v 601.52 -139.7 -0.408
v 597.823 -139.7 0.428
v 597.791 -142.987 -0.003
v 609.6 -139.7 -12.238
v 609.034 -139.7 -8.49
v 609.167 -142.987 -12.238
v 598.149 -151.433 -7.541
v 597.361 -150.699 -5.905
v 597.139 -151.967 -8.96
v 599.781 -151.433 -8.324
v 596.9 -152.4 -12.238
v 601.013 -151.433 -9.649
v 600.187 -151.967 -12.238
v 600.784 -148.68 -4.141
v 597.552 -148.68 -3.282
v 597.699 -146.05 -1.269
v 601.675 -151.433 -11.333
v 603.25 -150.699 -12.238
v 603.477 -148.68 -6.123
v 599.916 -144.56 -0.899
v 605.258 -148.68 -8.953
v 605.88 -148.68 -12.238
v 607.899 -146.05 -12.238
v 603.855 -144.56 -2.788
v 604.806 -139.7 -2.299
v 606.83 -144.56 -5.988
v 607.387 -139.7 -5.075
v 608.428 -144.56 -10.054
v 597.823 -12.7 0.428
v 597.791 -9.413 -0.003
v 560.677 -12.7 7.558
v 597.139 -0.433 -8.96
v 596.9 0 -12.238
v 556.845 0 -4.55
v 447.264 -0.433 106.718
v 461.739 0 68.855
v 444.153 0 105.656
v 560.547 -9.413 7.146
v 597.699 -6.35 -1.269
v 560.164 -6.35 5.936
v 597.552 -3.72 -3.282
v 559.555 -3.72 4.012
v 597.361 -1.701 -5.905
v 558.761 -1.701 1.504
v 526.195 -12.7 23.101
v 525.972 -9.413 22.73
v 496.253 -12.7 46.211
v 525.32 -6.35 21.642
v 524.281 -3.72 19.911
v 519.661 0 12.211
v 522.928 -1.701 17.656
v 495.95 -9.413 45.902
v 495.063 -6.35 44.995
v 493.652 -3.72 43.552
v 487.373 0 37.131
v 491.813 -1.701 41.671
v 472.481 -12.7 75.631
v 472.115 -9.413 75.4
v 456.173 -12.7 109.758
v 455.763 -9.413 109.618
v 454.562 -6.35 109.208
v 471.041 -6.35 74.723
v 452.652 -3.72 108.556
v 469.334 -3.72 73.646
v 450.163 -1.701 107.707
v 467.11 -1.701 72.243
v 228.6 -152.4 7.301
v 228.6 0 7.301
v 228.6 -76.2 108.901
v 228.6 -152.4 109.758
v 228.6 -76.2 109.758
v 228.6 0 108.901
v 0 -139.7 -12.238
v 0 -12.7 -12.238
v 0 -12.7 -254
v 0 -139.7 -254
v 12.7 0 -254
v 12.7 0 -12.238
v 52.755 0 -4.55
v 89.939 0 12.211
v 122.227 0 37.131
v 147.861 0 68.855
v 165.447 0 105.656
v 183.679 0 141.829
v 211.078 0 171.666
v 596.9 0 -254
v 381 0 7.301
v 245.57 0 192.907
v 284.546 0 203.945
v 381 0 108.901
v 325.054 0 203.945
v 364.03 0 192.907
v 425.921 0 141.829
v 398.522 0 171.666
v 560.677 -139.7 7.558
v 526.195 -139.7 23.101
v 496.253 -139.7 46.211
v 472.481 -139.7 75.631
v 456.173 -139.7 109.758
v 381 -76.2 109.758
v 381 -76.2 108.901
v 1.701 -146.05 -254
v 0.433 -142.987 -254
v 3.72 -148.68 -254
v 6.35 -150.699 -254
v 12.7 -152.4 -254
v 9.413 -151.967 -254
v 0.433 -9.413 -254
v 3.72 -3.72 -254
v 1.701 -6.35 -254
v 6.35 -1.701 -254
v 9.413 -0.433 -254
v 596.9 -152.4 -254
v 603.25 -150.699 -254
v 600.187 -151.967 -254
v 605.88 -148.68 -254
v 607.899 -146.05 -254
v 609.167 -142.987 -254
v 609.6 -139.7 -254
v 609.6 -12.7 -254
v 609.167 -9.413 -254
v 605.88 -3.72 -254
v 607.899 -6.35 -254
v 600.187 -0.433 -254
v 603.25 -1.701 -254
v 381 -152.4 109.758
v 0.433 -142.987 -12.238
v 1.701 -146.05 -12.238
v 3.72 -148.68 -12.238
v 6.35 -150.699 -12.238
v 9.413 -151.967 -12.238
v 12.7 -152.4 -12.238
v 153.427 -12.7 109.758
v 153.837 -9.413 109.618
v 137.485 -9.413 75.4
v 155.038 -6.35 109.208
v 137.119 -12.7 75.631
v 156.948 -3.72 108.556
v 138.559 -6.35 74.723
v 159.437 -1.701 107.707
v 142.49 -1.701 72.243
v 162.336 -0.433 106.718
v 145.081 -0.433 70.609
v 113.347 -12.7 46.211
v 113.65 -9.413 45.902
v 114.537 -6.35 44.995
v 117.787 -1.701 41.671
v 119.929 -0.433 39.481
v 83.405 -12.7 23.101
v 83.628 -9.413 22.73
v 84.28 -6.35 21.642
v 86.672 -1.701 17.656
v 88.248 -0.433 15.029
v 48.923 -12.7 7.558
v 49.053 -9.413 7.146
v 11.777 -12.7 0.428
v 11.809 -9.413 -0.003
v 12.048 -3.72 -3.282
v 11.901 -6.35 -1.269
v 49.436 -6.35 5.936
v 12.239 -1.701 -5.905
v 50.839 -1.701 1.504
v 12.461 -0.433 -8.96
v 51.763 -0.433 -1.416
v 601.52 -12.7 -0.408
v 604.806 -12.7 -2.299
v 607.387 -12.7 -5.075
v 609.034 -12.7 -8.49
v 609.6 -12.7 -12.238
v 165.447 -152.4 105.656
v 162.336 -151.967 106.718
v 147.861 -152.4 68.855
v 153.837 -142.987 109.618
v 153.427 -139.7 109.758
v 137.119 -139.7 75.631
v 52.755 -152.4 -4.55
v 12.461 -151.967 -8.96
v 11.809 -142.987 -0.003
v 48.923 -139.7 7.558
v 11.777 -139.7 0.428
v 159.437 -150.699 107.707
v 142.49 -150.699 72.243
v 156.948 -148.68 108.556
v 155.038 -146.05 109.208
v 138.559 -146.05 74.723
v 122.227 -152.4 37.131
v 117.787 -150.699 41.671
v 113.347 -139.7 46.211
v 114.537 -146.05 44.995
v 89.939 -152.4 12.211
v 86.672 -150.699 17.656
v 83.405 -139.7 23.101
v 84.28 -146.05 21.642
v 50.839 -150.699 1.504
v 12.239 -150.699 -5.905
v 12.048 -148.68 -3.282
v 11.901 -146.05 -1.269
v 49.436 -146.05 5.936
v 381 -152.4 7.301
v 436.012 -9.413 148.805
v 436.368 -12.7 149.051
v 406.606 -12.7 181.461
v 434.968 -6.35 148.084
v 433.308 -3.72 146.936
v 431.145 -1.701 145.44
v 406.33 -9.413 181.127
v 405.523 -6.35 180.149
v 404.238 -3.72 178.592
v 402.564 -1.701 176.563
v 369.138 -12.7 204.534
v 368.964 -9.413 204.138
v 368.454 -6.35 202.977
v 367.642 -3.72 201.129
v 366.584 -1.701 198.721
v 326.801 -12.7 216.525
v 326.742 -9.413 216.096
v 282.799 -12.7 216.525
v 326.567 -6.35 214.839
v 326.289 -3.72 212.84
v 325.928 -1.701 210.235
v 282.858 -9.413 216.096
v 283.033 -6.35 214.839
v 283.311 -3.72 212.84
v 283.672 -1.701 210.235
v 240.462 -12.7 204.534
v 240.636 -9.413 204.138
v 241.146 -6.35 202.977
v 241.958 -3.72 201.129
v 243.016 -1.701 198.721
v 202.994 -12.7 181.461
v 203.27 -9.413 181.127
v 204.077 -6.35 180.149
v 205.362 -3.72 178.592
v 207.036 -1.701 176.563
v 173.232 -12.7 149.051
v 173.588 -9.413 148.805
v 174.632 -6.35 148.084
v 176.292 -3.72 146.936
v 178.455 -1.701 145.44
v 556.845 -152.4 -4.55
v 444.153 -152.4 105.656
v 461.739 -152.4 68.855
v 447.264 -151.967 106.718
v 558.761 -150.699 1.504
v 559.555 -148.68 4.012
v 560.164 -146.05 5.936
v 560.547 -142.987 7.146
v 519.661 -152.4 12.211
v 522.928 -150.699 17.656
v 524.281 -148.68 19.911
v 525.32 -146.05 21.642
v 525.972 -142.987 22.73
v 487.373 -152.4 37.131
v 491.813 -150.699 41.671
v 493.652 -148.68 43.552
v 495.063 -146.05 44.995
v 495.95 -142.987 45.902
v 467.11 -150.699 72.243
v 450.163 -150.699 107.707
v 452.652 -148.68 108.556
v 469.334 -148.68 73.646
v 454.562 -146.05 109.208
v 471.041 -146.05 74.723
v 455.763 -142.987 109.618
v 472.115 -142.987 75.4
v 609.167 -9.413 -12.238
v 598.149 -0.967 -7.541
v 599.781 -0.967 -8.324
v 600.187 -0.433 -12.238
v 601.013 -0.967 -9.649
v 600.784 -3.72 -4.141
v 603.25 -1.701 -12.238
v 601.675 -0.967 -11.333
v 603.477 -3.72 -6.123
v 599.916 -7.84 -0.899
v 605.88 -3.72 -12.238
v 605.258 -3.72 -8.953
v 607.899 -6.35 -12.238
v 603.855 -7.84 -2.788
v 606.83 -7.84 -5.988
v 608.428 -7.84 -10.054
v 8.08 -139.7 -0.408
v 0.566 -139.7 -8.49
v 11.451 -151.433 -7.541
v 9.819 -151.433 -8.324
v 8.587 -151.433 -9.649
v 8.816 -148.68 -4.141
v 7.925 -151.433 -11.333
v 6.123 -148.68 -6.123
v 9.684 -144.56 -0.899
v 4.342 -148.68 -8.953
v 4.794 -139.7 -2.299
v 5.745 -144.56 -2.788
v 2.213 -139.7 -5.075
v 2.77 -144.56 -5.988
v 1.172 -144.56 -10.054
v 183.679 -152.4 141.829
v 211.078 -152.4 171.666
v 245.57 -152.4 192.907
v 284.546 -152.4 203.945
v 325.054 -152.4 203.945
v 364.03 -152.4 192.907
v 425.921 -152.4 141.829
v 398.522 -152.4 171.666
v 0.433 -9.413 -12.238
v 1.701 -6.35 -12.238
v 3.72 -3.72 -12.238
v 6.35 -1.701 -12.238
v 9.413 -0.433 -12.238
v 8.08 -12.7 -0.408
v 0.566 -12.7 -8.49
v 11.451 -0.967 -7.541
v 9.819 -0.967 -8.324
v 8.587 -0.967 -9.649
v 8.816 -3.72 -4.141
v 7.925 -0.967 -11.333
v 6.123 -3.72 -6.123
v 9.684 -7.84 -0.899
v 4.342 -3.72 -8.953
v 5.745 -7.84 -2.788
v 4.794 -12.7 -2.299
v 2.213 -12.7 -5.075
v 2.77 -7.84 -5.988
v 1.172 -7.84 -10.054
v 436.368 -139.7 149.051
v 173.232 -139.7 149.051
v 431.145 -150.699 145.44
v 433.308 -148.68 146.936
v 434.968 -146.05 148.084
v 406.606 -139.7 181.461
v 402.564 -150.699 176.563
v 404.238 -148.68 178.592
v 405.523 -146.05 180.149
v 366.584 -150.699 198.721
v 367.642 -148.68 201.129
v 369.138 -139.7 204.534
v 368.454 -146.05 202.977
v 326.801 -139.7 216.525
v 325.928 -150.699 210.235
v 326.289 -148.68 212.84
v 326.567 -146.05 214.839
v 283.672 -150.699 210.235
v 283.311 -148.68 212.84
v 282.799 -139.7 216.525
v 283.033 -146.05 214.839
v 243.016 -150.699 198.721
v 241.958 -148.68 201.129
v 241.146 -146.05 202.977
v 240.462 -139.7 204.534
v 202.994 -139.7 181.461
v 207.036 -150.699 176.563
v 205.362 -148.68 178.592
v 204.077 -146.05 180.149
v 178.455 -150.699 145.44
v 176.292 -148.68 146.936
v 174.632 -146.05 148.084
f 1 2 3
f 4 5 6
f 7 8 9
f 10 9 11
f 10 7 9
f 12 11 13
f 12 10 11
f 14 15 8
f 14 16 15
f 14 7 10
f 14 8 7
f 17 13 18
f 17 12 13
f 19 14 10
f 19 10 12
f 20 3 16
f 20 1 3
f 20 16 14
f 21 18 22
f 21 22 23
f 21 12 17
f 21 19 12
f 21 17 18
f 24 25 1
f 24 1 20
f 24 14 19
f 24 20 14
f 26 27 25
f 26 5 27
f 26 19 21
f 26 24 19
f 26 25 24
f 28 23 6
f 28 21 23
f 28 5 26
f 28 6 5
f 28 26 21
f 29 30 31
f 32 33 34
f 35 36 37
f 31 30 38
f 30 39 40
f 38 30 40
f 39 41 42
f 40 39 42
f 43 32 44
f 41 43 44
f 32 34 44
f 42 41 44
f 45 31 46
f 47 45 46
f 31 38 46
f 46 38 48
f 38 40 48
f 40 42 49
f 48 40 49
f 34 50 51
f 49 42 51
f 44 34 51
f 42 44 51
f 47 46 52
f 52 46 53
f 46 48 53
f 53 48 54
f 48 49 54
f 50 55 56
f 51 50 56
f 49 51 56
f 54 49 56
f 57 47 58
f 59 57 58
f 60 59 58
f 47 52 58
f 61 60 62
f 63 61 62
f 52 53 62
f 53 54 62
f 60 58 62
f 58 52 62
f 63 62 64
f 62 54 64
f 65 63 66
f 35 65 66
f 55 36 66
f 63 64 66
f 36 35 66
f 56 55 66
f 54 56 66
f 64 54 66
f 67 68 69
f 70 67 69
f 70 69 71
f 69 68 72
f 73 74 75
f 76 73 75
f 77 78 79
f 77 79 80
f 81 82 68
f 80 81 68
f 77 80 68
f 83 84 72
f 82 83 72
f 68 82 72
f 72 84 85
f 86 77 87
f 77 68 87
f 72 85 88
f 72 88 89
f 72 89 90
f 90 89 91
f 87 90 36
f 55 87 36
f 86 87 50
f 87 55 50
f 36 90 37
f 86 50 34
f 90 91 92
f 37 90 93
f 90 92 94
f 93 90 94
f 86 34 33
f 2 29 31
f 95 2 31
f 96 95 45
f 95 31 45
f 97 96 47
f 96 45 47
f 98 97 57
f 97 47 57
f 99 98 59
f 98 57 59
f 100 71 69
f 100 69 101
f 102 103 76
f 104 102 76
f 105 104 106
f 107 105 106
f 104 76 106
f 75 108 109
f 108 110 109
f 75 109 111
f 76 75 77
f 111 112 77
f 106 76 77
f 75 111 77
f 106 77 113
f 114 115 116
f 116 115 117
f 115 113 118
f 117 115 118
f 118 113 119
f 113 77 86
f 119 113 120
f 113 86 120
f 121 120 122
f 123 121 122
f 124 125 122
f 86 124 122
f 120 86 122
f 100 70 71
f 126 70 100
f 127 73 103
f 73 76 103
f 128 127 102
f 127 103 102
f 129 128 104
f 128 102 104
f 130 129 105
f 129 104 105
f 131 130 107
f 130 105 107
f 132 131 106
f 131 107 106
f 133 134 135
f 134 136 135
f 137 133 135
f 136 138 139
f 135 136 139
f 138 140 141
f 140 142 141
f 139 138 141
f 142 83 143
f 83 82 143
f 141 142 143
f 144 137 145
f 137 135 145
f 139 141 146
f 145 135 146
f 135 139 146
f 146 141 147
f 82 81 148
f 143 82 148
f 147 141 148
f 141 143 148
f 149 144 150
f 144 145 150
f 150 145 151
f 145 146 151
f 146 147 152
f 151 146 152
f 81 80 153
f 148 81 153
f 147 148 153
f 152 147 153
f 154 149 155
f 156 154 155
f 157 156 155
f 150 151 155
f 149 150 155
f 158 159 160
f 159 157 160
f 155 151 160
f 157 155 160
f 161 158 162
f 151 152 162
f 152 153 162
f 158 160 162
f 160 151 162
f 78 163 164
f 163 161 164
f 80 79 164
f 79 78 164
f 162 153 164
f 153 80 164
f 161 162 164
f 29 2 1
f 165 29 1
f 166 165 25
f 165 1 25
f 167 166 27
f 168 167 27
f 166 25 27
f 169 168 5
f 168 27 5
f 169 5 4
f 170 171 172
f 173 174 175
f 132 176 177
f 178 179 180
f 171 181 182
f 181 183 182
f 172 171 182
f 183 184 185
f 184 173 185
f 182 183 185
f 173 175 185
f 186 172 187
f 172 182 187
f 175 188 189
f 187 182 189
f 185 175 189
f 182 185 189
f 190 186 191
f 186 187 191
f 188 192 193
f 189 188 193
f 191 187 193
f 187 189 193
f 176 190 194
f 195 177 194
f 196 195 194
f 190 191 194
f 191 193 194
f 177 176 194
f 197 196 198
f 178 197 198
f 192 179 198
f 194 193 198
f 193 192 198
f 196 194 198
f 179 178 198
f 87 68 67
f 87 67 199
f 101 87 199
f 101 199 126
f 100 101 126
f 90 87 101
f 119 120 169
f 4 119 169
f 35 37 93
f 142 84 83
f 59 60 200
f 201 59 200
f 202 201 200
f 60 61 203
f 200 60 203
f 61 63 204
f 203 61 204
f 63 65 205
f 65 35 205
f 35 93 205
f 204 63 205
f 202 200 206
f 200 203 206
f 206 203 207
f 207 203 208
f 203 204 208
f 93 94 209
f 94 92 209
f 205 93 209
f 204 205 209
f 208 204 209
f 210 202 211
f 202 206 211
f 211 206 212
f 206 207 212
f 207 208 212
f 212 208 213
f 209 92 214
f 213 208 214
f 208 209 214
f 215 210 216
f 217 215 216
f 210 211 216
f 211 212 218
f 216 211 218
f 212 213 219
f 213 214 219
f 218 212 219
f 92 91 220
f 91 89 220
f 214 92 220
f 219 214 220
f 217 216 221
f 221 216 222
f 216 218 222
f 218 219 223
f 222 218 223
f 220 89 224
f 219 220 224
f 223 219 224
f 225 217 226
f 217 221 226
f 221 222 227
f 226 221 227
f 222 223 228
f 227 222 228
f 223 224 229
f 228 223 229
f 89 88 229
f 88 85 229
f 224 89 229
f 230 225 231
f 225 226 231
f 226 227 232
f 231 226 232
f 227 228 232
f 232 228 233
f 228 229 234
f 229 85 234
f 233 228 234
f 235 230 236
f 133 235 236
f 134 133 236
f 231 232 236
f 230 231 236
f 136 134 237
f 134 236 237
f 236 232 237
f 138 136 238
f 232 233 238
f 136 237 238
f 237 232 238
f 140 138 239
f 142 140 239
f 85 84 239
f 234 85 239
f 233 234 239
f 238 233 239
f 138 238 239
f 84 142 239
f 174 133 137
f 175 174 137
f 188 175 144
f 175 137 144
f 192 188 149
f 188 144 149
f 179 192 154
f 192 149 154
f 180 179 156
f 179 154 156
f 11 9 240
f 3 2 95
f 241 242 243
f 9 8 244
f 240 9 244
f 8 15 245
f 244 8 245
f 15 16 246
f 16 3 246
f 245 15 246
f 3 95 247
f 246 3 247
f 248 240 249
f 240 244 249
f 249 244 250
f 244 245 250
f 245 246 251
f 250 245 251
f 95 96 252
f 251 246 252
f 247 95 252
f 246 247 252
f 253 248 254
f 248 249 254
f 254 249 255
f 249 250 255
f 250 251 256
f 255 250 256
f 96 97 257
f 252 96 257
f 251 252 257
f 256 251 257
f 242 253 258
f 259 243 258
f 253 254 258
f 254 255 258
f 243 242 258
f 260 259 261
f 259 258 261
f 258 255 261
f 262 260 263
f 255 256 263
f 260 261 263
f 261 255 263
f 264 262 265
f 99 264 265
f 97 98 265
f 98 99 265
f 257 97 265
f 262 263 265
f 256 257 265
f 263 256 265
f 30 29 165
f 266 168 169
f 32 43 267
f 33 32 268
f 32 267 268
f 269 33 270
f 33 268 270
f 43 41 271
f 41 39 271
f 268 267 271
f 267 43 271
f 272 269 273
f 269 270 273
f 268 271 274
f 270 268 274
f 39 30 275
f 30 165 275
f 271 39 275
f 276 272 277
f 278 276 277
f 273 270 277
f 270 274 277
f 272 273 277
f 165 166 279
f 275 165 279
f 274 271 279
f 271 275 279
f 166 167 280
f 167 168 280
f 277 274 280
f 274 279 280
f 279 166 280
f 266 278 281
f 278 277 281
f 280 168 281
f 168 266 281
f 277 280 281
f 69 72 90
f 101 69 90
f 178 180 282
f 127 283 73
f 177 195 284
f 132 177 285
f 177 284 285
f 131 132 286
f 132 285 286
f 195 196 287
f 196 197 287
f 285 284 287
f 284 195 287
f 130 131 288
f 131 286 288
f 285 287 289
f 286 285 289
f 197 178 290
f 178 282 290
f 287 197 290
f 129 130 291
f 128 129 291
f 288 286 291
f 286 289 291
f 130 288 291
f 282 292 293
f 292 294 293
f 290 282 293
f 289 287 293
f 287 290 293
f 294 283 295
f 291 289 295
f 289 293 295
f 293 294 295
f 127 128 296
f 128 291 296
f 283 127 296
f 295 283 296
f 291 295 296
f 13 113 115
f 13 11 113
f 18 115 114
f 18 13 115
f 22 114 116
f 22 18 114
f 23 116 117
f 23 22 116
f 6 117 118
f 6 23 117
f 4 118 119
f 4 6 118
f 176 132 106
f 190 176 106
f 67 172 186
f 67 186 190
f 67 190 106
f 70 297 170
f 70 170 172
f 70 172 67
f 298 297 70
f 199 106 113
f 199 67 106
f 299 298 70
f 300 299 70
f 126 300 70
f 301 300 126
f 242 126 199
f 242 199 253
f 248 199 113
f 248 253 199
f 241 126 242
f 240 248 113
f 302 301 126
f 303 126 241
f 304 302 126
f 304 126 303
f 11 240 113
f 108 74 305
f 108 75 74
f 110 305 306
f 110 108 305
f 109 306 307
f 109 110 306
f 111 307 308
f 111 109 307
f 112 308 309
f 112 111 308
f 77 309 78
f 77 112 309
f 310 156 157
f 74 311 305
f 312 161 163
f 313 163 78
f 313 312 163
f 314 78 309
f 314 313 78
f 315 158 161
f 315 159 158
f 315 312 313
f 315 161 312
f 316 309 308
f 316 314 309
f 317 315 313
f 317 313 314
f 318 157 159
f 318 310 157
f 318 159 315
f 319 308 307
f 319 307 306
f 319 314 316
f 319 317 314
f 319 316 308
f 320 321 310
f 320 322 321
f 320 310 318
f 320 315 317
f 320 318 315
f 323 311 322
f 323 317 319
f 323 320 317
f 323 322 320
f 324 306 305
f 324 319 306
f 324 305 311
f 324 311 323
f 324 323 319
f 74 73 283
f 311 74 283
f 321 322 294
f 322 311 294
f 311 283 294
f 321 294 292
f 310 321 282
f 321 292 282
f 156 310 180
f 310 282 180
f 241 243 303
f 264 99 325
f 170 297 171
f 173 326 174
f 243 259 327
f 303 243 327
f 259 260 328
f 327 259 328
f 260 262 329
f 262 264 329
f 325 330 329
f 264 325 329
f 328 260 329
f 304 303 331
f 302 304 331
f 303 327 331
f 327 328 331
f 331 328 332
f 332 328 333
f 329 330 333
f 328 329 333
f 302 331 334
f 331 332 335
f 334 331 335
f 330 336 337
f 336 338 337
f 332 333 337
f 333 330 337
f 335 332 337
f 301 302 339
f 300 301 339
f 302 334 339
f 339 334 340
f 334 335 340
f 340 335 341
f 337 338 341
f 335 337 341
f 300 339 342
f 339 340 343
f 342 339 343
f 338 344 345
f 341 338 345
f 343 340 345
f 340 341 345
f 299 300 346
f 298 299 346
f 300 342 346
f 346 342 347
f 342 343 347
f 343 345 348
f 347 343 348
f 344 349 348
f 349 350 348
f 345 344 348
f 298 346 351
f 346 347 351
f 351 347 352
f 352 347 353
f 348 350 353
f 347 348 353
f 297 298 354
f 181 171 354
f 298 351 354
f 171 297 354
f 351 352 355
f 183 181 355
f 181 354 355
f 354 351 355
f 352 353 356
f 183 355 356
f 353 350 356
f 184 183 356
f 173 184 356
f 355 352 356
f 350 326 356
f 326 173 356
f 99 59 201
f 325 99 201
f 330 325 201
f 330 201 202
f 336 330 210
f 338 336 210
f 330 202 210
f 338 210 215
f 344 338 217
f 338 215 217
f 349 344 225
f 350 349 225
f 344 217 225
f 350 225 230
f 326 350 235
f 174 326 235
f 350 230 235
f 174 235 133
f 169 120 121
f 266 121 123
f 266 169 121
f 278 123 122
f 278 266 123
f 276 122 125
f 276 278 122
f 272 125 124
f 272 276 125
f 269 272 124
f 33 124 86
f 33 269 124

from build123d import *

# Parameters (mm, degrees)
F0_W     = 152.4
F0_H     = 101.6
F1_DEPTH = 152.4
F2_W     = 152.4
F2_H     = 0.8561833287
F3_DEPTH = 76.2
F4_R     = 12.7


with BuildPart() as f1:
    # F0 (on Front) → F1 (new body)
    with BuildSketch(Plane.XZ):
        with BuildLine():
            Line((0, 0), (0, -254))
            Line((0, -254), (609.6, -254))
            Line((609.6, -254), (609.6, 0))
            ThreePointArc((609.6, 0), (515.2777766961, 30.2643447869), (456.1725186703, 109.7576202765))
            ThreePointArc((456.1725186703, 109.7576202765), (304.8, 218.0451791971), (153.4274813297, 109.7576202765))
            ThreePointArc((153.4274813297, 109.7576202765), (94.3222233039, 30.2643447869), (0, 0))
        make_face()
        with Locations((304.8, 58.1014369479)):
            Rectangle(F0_W, F0_H, mode=Mode.SUBTRACT)
    extrude(amount=F1_DEPTH)

    # F2 (on face) → F3 (cut)
    with BuildSketch(Plane.XZ.offset(152.4)):
        with Locations((304.8, 109.3295286122)):
            Rectangle(F2_W, F2_H)
    extrude(amount=-F3_DEPTH, mode=Mode.SUBTRACT)

    # F4
    f4_edges = [f1.edges().sort_by_distance(p)[0] for p in [
        (609.6, -76.2, 0),
        (0, -76.2, 0),
        (515.277777, -152.4, 30.264345),
        (304.8, -152.4, 218.045179),
        (304.8, 0, 218.045179),
        (515.277777, 0, 30.264345),
        (609.6, -152.4, -127),
        (609.6, 0, -127),
        (0, -152.4, -127),
        (0, 0, -127),
    ]]
    fillet(f4_edges, radius=F4_R)


solid = f1.part
